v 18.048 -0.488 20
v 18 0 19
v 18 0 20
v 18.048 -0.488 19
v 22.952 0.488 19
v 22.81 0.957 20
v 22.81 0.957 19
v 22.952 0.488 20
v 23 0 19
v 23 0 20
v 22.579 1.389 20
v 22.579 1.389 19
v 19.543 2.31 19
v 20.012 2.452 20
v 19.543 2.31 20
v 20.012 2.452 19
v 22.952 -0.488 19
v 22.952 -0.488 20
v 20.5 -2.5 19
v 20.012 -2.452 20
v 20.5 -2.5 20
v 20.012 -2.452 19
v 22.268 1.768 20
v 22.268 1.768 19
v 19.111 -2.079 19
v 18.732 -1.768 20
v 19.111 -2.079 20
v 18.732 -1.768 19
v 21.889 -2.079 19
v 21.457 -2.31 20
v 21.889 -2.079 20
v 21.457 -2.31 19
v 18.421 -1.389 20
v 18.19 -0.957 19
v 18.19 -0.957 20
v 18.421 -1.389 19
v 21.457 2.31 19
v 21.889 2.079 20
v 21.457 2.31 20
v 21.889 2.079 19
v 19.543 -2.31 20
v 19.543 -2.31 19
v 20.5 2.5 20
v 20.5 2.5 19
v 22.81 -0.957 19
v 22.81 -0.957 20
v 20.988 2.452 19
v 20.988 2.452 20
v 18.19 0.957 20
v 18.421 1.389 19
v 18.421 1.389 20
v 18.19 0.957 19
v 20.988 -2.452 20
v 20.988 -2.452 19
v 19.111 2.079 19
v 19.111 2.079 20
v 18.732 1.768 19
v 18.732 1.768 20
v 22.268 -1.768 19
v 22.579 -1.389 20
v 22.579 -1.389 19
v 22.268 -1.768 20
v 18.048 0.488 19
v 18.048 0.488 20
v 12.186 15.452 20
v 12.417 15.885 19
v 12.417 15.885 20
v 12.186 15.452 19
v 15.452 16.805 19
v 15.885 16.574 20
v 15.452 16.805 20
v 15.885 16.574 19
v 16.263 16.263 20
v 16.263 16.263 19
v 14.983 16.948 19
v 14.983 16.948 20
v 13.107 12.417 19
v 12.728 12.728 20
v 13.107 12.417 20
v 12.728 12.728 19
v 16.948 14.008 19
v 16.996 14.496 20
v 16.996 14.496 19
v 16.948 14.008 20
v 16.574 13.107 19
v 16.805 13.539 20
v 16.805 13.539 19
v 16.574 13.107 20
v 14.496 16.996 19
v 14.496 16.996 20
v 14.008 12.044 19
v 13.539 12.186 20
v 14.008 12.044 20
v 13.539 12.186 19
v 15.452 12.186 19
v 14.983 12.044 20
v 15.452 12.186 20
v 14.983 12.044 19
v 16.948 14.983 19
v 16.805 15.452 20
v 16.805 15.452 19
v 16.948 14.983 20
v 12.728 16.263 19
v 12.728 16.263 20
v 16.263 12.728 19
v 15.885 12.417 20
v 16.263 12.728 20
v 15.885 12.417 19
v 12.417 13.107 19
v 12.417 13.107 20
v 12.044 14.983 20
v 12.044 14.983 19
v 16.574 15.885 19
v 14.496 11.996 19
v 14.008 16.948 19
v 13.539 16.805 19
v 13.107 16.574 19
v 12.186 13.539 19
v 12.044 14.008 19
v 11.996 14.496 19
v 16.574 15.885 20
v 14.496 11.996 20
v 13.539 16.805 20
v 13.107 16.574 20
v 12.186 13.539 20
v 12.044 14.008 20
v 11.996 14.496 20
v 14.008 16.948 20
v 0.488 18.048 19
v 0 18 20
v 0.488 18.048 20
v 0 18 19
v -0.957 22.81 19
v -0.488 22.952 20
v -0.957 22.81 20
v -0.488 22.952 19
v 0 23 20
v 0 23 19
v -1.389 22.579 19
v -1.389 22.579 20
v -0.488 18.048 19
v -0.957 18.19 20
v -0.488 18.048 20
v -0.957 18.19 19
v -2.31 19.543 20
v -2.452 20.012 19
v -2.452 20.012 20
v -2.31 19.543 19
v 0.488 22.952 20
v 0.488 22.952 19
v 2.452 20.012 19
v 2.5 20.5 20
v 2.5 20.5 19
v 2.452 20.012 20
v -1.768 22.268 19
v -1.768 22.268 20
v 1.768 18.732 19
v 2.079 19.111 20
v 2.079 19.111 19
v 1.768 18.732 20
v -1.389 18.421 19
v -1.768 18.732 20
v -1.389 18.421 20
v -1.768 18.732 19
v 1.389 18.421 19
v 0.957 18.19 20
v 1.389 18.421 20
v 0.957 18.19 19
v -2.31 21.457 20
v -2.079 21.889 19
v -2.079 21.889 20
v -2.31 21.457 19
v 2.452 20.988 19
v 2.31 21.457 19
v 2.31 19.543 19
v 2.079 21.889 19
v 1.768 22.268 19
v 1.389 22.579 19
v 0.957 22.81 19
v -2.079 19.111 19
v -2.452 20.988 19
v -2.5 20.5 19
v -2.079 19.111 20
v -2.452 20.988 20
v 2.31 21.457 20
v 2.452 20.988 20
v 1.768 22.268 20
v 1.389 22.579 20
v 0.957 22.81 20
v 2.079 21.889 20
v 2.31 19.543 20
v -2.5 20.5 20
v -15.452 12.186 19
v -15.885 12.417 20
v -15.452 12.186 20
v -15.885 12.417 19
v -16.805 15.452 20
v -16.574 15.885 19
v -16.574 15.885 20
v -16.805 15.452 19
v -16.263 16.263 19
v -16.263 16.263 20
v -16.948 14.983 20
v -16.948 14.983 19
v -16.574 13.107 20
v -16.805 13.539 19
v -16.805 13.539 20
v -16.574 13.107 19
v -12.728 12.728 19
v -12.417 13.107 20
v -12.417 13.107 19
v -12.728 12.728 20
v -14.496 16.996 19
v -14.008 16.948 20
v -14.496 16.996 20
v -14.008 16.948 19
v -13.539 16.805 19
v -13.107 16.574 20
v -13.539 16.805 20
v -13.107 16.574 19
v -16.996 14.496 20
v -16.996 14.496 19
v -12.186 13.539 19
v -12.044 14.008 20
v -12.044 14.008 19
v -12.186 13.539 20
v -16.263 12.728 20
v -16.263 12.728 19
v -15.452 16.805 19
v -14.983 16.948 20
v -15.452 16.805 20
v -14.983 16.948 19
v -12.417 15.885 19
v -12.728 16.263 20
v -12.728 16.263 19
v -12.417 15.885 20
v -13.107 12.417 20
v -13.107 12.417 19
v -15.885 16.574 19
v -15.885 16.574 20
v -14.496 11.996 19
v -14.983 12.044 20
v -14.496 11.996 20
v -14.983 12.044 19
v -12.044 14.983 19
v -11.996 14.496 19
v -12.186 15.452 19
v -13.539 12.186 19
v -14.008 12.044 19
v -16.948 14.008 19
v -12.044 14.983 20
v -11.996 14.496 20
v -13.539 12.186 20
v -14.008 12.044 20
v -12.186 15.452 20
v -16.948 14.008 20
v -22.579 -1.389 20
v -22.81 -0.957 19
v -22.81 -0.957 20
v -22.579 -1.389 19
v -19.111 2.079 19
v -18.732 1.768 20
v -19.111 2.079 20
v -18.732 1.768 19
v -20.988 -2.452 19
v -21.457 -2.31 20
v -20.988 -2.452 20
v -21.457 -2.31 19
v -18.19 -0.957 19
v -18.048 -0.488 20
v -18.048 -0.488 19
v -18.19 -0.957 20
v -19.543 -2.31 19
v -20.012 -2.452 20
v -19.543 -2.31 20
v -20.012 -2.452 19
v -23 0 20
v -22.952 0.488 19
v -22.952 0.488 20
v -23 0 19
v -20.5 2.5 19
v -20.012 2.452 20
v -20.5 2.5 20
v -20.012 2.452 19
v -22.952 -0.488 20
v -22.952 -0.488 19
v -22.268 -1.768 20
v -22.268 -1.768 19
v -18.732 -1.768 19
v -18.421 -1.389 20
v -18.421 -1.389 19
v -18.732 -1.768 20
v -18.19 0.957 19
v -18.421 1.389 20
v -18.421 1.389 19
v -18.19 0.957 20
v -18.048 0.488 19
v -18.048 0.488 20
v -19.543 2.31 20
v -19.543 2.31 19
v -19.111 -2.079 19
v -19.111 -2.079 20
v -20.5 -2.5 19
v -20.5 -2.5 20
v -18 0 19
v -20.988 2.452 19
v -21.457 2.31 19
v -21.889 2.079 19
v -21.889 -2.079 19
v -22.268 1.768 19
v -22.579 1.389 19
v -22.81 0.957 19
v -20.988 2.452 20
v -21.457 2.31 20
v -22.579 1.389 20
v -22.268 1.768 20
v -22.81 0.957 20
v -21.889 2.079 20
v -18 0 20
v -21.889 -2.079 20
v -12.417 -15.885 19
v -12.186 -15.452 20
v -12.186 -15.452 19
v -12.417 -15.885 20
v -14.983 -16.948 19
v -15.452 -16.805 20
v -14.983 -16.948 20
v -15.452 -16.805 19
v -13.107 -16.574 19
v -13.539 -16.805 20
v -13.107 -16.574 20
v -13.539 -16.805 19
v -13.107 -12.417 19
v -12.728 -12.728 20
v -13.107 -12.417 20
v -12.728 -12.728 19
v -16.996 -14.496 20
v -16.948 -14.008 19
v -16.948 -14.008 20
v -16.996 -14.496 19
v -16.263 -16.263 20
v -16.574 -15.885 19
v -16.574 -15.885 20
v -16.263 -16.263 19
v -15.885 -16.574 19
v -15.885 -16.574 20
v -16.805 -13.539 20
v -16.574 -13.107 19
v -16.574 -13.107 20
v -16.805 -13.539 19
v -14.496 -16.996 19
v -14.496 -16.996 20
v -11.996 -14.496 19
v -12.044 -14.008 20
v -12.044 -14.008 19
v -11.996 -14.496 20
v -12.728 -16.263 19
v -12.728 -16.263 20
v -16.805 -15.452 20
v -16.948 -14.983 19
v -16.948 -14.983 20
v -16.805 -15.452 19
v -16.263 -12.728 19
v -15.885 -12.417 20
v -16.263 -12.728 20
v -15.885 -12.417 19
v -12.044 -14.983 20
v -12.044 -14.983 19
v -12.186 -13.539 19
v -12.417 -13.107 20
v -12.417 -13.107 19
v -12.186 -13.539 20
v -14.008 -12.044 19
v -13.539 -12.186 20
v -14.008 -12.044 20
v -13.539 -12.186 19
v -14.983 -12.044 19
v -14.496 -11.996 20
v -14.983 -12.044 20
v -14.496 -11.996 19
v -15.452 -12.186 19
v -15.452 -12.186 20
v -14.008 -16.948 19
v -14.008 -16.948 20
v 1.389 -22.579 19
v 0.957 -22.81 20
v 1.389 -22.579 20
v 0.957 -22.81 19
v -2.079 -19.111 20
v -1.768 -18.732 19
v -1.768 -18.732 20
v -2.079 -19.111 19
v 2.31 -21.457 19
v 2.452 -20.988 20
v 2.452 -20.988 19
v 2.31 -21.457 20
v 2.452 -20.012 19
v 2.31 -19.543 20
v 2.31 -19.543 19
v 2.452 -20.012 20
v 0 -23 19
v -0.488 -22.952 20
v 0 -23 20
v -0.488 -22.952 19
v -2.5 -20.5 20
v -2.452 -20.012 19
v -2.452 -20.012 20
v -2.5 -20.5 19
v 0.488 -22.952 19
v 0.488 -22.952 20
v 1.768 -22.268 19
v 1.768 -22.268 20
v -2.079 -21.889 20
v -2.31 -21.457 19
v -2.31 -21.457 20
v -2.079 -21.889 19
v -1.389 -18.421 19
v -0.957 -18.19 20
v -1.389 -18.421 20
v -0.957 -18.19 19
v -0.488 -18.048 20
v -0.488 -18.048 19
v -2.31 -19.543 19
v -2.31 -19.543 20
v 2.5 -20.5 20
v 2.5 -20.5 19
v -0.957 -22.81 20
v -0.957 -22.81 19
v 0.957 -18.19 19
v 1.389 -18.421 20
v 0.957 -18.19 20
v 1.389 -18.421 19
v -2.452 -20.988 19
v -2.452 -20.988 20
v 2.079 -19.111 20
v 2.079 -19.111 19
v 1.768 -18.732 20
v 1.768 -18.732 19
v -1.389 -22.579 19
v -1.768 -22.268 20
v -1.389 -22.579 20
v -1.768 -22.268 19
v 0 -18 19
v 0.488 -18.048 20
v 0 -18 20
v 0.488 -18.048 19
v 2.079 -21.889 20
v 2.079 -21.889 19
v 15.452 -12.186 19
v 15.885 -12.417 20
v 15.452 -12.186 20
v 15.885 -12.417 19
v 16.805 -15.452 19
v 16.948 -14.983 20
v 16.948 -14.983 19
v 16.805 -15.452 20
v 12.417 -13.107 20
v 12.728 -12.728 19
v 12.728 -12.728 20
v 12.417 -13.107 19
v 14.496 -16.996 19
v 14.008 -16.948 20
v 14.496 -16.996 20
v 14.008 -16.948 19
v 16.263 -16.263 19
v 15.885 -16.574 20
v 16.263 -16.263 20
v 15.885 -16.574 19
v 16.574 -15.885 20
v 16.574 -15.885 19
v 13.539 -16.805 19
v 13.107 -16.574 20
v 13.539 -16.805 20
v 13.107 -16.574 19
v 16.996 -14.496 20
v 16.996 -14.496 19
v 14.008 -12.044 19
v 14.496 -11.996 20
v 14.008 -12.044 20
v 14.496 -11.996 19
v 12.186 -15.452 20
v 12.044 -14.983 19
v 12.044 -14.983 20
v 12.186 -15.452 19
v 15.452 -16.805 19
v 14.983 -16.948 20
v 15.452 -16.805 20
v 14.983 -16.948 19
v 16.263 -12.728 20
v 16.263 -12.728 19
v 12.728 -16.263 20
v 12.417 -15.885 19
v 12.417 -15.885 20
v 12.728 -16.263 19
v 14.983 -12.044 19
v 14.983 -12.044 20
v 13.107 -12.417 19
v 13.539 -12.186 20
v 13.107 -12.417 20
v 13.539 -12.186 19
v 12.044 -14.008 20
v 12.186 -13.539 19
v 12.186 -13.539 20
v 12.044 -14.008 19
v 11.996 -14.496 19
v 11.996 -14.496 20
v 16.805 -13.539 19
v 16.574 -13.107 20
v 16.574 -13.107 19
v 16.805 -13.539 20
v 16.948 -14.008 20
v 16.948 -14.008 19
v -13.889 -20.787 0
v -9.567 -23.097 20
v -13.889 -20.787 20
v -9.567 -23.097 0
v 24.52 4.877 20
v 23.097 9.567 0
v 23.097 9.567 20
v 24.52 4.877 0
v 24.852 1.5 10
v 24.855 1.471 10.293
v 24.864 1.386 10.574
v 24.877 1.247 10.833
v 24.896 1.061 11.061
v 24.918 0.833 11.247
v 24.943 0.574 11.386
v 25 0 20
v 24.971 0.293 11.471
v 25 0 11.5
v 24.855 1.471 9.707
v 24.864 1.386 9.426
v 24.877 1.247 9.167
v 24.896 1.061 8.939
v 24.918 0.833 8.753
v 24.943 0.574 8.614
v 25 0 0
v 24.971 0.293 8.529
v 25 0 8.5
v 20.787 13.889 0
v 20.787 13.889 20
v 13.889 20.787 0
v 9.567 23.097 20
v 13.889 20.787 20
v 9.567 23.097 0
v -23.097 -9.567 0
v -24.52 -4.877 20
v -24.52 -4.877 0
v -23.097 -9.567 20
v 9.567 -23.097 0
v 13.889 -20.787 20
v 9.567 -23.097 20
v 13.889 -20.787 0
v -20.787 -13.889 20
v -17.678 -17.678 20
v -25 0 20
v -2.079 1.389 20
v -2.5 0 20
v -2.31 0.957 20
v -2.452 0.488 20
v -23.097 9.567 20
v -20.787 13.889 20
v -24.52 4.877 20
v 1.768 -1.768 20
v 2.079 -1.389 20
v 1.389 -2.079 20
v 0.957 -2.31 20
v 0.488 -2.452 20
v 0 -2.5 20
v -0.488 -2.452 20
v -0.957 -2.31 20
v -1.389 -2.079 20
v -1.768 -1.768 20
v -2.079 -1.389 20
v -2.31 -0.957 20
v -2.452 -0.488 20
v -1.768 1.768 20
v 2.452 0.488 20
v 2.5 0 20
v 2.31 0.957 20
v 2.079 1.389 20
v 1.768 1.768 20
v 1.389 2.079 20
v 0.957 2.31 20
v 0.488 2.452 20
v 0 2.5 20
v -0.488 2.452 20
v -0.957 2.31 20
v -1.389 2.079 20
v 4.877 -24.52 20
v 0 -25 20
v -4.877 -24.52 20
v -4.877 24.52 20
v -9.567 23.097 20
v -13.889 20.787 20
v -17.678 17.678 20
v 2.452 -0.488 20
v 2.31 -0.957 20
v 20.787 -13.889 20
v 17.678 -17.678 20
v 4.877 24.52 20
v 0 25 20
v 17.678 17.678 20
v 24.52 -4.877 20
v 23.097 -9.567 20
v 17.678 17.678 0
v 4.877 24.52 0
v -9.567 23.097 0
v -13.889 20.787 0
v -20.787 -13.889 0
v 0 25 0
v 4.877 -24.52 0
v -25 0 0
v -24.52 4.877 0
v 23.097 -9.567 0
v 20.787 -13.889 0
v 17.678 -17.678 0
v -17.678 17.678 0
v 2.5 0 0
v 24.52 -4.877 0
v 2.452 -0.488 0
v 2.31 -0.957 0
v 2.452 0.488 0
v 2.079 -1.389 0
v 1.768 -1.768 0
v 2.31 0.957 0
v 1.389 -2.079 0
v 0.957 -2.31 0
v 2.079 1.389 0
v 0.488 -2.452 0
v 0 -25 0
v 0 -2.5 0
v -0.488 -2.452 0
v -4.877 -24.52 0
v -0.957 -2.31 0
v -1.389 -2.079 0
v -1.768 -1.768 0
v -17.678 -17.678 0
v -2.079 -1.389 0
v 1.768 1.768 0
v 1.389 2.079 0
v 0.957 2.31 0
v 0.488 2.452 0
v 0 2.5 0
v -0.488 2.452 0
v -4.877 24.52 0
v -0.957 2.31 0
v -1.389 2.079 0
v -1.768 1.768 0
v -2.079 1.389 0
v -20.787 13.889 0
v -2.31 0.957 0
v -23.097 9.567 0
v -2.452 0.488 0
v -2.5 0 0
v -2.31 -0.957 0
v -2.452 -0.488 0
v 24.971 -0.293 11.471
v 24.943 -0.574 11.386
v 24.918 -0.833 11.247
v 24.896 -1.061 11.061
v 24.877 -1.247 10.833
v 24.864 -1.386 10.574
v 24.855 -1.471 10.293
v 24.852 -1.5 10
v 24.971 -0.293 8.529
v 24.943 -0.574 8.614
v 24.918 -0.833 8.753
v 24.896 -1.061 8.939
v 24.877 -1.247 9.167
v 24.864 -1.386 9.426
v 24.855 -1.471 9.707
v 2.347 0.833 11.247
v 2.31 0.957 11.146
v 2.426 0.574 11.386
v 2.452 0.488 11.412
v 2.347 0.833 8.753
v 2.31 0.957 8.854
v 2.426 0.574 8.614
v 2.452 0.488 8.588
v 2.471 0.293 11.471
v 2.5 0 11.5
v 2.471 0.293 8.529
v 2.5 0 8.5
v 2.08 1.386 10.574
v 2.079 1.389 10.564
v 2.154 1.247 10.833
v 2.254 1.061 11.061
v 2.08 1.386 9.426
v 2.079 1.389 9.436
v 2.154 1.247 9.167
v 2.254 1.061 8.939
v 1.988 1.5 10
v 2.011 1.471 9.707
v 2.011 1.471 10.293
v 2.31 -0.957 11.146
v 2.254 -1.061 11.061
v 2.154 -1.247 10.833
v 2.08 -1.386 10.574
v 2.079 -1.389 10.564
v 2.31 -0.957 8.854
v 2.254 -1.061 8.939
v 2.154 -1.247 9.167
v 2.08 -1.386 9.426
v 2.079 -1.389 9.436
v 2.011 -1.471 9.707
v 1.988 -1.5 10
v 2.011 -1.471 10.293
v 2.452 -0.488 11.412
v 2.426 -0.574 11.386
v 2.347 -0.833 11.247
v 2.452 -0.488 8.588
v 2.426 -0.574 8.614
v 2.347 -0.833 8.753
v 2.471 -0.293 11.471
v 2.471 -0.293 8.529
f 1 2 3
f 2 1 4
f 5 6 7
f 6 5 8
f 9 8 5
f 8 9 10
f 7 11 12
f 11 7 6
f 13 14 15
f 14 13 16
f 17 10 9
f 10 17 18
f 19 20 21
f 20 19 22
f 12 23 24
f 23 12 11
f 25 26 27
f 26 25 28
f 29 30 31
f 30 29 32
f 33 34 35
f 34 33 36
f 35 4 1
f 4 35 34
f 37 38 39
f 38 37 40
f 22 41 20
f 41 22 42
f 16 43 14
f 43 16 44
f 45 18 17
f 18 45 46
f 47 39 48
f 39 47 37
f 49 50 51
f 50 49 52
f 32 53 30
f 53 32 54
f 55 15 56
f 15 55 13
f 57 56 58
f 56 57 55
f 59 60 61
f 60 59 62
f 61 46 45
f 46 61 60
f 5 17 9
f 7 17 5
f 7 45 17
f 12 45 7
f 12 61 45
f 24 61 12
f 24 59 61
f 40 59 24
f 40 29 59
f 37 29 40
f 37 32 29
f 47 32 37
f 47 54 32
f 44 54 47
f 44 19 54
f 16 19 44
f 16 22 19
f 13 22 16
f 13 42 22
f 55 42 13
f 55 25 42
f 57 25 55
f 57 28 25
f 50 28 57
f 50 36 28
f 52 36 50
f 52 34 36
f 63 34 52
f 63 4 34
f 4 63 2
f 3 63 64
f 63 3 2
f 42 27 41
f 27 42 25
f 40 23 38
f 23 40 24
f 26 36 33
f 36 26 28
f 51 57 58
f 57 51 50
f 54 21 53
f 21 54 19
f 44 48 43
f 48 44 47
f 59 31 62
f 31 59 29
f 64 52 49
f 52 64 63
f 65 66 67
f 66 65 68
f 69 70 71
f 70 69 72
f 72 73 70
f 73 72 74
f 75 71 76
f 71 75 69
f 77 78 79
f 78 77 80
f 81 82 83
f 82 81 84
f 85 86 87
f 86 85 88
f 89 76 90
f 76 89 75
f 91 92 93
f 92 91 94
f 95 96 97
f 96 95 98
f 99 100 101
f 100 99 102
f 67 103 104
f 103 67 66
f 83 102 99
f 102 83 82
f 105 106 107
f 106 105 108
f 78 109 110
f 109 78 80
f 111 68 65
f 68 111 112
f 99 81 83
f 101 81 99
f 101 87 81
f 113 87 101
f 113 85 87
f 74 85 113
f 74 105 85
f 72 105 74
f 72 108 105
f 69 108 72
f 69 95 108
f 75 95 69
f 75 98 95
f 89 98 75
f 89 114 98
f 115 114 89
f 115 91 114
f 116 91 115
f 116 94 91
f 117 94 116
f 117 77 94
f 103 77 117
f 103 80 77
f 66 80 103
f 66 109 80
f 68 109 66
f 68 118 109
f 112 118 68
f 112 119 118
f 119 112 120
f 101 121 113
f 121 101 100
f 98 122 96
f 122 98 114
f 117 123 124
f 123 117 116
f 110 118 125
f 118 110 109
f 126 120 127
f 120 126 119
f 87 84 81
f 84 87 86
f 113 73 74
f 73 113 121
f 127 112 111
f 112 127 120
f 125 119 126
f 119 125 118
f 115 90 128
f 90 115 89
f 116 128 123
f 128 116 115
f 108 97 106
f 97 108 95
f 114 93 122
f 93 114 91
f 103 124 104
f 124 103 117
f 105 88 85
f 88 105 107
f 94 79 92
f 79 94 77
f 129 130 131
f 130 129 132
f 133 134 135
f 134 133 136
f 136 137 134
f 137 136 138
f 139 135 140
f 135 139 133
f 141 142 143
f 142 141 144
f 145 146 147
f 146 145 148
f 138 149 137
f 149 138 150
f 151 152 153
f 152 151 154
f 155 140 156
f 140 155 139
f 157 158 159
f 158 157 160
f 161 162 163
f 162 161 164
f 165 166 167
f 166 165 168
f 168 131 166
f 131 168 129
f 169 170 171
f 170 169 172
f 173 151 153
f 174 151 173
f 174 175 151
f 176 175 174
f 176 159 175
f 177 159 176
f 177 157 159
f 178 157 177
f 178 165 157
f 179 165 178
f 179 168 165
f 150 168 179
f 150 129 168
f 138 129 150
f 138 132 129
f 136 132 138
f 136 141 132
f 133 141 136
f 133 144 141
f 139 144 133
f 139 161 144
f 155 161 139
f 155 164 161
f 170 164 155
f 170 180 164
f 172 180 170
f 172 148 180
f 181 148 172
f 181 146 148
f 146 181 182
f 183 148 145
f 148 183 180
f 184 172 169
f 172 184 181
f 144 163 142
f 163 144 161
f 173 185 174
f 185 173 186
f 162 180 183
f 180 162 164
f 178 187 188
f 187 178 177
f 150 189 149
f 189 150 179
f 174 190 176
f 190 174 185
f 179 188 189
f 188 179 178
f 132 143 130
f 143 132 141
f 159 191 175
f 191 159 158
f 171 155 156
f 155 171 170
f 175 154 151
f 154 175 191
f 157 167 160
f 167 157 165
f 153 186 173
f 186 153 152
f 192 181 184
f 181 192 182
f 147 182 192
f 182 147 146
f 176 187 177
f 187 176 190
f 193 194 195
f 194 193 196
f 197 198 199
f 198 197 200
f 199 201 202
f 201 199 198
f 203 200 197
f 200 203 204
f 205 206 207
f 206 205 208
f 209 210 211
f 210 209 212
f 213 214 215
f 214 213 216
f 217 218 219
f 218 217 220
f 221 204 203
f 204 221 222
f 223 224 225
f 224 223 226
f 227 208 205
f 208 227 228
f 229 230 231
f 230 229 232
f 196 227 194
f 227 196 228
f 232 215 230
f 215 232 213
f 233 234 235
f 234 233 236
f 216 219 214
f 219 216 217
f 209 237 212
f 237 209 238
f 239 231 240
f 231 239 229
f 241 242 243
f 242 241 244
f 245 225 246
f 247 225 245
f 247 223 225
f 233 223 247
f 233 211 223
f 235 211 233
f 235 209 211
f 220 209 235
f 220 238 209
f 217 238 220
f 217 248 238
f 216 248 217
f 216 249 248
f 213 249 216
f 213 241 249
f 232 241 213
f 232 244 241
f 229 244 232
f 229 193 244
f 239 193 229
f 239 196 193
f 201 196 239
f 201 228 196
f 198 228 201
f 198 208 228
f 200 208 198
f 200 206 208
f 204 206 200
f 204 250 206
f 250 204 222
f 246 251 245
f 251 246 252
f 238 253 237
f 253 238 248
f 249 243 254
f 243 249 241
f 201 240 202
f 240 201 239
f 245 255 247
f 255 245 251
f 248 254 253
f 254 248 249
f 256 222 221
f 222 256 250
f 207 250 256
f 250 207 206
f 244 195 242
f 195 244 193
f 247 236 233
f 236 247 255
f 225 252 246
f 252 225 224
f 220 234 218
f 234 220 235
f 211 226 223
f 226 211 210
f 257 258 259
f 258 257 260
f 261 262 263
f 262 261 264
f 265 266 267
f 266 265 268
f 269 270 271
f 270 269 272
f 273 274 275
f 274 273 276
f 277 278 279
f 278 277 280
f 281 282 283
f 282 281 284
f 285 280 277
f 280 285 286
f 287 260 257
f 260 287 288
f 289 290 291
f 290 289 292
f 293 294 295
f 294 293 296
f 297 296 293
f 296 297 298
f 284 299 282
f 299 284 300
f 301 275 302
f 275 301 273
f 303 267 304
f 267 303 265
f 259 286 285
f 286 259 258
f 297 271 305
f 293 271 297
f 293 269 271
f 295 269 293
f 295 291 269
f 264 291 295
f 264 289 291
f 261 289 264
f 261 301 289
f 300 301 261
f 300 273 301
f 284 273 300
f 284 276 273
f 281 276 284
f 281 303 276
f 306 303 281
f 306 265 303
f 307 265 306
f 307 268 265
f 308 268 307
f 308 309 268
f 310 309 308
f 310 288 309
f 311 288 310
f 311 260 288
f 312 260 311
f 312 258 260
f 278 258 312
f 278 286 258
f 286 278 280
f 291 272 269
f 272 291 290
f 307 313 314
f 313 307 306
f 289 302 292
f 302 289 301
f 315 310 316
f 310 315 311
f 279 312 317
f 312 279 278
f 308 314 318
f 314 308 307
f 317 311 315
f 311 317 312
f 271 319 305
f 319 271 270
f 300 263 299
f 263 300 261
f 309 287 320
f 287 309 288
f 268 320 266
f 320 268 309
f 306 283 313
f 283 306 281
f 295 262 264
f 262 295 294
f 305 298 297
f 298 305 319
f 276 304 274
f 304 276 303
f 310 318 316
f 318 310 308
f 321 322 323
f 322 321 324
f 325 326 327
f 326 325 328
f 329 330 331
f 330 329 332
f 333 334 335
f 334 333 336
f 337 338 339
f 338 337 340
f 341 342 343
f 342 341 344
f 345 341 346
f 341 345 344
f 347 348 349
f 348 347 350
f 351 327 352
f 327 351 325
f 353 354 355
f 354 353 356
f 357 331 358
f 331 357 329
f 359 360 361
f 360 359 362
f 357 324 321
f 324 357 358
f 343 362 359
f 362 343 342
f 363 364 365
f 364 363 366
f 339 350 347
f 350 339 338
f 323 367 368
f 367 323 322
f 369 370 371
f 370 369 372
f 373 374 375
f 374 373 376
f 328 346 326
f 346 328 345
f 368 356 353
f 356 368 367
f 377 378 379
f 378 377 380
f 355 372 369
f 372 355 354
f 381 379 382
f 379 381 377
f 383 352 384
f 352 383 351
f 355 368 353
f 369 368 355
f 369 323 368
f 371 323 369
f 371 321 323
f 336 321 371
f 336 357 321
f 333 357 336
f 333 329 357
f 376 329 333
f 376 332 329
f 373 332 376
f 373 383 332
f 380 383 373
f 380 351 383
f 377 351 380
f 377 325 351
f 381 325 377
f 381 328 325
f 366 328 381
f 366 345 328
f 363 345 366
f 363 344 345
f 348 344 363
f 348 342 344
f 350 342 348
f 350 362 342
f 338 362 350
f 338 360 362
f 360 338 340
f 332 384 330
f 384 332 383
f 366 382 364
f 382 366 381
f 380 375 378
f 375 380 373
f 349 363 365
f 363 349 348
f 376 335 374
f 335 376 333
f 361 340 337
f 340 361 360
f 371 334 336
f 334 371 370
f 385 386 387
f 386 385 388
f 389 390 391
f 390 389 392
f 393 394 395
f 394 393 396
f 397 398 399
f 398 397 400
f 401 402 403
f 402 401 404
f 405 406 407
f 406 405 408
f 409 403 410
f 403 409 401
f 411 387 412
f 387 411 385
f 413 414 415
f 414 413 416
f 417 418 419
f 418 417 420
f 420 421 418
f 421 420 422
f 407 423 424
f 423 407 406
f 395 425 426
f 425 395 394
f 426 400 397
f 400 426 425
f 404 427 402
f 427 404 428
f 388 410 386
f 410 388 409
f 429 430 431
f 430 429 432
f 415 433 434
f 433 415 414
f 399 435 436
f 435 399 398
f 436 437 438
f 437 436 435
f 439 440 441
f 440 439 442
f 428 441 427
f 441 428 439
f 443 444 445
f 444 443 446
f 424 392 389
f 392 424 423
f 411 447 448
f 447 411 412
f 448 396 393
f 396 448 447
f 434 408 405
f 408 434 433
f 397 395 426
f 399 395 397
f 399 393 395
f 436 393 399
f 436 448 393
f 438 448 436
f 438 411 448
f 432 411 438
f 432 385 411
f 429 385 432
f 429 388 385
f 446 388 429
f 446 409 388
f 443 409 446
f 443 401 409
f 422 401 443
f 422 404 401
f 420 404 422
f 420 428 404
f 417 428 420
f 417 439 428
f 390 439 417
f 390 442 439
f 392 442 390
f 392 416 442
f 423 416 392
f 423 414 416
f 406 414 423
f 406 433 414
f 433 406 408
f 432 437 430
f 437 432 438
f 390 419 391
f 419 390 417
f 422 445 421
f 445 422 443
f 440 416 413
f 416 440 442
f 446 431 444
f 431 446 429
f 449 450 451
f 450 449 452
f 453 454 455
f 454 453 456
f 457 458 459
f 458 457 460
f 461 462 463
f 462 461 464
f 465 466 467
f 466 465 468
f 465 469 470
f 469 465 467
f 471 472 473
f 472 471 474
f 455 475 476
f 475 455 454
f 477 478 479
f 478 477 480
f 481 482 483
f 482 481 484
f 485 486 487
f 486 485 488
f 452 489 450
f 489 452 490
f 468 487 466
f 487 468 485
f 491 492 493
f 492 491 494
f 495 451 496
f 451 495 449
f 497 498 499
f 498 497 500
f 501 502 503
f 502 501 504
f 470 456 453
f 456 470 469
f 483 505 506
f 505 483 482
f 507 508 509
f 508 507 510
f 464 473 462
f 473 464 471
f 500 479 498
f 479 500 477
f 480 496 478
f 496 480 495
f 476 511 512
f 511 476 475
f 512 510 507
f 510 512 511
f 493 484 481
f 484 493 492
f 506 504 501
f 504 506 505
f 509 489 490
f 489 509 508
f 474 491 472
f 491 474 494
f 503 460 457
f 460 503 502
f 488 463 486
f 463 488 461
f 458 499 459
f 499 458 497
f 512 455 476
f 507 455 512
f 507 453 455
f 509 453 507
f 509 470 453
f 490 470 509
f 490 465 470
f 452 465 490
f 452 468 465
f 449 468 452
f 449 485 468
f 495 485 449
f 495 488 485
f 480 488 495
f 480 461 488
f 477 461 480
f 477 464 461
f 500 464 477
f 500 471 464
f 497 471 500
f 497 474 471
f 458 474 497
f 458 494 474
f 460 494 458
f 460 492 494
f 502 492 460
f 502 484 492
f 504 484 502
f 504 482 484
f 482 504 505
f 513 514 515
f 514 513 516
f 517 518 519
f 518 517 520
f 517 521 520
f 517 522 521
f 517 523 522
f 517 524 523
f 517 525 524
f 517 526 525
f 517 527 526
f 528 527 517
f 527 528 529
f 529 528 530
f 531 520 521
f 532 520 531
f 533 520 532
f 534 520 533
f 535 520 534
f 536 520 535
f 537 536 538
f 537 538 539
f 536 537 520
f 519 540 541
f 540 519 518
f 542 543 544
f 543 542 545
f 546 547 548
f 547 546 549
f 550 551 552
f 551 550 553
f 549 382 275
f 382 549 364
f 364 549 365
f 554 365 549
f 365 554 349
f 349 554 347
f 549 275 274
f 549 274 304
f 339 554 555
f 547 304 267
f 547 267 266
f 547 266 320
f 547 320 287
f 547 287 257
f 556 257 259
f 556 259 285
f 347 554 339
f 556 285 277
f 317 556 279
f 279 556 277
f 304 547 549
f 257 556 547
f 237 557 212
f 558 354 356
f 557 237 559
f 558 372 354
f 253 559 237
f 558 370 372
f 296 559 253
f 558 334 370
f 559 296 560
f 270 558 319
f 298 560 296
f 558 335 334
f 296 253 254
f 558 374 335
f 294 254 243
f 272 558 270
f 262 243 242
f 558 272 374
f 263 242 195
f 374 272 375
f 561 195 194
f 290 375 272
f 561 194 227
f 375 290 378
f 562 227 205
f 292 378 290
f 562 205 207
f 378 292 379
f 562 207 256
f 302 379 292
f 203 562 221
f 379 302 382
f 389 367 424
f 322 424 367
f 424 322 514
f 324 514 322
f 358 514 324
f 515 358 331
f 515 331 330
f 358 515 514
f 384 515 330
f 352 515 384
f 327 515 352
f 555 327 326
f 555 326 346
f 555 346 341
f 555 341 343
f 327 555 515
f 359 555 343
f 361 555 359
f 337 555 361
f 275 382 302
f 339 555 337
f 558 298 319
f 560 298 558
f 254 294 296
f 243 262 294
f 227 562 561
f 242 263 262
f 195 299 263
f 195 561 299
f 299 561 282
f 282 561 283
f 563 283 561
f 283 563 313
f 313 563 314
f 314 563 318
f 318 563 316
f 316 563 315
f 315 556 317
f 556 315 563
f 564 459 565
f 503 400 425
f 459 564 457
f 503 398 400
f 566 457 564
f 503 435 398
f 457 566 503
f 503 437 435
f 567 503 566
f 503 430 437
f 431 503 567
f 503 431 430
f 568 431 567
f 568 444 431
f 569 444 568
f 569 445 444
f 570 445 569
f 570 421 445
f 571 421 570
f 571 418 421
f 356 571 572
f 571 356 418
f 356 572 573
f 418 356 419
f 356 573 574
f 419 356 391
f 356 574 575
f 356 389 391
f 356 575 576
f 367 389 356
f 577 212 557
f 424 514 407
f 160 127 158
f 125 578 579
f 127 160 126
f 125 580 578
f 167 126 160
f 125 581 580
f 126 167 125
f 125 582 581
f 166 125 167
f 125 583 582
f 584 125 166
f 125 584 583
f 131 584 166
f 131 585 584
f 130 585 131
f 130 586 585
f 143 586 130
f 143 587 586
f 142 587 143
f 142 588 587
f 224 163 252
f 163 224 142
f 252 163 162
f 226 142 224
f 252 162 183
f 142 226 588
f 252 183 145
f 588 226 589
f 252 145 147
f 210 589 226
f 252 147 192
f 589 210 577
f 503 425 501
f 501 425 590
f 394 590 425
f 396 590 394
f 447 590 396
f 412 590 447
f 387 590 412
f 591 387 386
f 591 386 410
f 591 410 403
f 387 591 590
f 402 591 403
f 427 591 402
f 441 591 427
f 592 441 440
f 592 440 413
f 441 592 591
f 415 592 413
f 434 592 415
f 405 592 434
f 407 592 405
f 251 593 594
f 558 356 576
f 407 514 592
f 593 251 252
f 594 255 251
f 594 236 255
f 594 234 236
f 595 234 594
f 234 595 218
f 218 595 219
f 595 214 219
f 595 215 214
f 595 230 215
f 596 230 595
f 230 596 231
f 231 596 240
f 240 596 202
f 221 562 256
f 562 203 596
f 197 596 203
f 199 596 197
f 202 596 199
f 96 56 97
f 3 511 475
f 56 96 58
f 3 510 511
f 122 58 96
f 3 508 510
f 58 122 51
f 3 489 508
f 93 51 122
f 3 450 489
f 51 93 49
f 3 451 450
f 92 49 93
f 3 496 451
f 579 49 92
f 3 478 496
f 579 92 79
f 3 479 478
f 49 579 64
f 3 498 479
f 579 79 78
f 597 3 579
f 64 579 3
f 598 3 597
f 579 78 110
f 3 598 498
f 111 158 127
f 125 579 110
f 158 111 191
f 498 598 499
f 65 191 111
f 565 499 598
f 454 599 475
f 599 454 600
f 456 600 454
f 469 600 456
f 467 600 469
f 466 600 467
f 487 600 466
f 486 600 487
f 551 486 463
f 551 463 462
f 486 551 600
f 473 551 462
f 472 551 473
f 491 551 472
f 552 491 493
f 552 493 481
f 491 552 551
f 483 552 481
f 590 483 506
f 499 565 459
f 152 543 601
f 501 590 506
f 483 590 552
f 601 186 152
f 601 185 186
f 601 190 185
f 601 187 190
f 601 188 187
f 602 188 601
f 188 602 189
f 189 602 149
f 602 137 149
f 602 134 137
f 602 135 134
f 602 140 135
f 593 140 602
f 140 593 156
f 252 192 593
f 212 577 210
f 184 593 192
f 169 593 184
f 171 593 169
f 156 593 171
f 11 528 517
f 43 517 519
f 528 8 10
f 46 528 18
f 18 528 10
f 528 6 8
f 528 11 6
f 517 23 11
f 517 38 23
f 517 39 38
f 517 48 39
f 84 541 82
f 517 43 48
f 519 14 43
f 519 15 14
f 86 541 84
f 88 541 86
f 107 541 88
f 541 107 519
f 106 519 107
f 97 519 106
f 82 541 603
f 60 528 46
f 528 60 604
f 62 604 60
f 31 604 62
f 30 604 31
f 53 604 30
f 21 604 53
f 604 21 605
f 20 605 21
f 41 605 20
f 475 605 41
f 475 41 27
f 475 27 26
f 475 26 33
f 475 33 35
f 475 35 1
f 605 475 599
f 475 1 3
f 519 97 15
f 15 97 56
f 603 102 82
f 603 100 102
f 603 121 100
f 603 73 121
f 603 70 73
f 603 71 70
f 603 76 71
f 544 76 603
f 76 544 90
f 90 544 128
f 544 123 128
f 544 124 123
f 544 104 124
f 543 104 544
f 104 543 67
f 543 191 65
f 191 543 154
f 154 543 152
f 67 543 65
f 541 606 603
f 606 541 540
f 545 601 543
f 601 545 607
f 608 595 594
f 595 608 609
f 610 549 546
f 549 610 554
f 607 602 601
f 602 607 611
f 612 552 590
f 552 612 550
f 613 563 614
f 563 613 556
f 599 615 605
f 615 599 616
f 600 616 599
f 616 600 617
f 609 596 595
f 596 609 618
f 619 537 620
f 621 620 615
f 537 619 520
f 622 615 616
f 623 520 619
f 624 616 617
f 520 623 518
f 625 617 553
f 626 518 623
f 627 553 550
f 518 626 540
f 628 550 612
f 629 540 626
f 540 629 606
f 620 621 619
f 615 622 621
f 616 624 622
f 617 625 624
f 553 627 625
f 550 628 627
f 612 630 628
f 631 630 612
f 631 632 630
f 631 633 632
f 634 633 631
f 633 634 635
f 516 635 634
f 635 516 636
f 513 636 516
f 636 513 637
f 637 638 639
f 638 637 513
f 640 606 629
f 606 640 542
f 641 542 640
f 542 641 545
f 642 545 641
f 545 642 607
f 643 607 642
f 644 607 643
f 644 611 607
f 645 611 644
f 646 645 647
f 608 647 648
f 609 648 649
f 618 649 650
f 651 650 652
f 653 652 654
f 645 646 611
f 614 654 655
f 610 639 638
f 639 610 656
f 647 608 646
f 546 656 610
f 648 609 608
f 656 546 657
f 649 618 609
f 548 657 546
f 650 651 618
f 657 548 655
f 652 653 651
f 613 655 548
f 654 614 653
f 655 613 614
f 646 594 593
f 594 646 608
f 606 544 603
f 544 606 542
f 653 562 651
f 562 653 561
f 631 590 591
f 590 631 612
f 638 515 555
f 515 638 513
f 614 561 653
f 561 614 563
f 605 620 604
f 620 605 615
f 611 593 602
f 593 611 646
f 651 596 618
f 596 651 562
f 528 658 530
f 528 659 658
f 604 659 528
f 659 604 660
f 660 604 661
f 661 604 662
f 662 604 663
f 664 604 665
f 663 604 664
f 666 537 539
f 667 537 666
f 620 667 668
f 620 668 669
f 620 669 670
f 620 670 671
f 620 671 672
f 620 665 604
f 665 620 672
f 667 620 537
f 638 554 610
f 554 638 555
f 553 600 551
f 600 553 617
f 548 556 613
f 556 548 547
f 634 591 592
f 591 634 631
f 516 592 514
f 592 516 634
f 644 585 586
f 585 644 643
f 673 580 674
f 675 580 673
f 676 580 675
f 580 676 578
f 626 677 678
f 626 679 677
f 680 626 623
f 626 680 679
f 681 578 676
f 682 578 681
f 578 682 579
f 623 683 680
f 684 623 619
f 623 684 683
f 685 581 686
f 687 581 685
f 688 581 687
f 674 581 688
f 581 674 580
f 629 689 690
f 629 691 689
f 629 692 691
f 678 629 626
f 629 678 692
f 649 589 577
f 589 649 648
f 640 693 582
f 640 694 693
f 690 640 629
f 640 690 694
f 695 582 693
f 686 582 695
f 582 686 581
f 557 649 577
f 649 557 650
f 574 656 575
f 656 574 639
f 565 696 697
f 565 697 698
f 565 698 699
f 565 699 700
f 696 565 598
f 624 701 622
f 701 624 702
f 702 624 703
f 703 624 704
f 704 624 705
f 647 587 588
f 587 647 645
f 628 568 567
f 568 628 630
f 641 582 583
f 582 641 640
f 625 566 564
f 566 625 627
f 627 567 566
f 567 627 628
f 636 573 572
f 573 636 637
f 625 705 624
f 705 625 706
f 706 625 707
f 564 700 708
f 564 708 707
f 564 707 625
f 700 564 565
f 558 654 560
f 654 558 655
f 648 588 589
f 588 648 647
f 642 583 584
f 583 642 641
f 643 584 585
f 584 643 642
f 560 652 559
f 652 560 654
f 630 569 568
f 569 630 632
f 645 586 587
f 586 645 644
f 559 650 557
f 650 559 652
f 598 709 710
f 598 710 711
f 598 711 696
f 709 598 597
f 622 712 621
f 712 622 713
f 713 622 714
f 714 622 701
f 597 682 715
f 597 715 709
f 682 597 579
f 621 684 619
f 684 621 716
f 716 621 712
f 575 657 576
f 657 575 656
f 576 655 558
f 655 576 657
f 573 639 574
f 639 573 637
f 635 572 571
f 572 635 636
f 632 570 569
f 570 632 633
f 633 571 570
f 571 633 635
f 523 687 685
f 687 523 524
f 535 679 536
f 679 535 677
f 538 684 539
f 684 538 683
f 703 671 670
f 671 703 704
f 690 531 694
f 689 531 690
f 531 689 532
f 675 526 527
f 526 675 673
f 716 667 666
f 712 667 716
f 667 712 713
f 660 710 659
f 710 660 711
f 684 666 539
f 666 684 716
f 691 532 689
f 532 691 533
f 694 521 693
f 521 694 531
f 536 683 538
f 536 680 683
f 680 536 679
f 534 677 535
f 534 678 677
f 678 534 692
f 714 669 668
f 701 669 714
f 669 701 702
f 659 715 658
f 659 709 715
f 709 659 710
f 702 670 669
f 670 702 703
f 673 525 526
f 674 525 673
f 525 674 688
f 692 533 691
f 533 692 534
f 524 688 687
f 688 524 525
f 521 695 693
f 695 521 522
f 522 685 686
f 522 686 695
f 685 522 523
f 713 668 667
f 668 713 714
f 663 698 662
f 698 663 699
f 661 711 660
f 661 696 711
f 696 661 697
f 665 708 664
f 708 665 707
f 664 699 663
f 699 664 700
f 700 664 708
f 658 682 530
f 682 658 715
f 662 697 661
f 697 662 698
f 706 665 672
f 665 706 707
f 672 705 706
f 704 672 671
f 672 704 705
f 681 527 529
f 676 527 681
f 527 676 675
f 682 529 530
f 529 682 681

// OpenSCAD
$fn = 32;

// ----------------------------------------------------------------------
// Control knob: dimpled knob
// ----------------------------------------------------------------------

// --- parameters (mm) ---
dimp_d = 5;               // finger dimple diameter
n_dimp = 8;               // number of dimples
dimp_r = 20.5;            // dimple ring radius
knob_d = 50;              // knob body diameter
knob_h = 20;              // knob body height
bore_d = 5;               // shaft bore diameter
set_d = 3;                // set screw bore diameter

dimp_step = 360 / n_dimp;  // dimple angular step

difference() {
  cylinder(h = knob_h, d = knob_d);
  translate([0, 0, -1]) cylinder(h = knob_h + 2, d = bore_d);
  translate([-1, 0, knob_h / 2]) rotate([0, 90, 0])
    cylinder(h = knob_d / 2 + bore_d / 2 + 2, d = set_d);  for (i = [0 : n_dimp - 1])
    rotate([0, 0, i * dimp_step])
      translate([dimp_r, 0, knob_h - 1])
        cylinder(h = 2, d = dimp_d);
}
